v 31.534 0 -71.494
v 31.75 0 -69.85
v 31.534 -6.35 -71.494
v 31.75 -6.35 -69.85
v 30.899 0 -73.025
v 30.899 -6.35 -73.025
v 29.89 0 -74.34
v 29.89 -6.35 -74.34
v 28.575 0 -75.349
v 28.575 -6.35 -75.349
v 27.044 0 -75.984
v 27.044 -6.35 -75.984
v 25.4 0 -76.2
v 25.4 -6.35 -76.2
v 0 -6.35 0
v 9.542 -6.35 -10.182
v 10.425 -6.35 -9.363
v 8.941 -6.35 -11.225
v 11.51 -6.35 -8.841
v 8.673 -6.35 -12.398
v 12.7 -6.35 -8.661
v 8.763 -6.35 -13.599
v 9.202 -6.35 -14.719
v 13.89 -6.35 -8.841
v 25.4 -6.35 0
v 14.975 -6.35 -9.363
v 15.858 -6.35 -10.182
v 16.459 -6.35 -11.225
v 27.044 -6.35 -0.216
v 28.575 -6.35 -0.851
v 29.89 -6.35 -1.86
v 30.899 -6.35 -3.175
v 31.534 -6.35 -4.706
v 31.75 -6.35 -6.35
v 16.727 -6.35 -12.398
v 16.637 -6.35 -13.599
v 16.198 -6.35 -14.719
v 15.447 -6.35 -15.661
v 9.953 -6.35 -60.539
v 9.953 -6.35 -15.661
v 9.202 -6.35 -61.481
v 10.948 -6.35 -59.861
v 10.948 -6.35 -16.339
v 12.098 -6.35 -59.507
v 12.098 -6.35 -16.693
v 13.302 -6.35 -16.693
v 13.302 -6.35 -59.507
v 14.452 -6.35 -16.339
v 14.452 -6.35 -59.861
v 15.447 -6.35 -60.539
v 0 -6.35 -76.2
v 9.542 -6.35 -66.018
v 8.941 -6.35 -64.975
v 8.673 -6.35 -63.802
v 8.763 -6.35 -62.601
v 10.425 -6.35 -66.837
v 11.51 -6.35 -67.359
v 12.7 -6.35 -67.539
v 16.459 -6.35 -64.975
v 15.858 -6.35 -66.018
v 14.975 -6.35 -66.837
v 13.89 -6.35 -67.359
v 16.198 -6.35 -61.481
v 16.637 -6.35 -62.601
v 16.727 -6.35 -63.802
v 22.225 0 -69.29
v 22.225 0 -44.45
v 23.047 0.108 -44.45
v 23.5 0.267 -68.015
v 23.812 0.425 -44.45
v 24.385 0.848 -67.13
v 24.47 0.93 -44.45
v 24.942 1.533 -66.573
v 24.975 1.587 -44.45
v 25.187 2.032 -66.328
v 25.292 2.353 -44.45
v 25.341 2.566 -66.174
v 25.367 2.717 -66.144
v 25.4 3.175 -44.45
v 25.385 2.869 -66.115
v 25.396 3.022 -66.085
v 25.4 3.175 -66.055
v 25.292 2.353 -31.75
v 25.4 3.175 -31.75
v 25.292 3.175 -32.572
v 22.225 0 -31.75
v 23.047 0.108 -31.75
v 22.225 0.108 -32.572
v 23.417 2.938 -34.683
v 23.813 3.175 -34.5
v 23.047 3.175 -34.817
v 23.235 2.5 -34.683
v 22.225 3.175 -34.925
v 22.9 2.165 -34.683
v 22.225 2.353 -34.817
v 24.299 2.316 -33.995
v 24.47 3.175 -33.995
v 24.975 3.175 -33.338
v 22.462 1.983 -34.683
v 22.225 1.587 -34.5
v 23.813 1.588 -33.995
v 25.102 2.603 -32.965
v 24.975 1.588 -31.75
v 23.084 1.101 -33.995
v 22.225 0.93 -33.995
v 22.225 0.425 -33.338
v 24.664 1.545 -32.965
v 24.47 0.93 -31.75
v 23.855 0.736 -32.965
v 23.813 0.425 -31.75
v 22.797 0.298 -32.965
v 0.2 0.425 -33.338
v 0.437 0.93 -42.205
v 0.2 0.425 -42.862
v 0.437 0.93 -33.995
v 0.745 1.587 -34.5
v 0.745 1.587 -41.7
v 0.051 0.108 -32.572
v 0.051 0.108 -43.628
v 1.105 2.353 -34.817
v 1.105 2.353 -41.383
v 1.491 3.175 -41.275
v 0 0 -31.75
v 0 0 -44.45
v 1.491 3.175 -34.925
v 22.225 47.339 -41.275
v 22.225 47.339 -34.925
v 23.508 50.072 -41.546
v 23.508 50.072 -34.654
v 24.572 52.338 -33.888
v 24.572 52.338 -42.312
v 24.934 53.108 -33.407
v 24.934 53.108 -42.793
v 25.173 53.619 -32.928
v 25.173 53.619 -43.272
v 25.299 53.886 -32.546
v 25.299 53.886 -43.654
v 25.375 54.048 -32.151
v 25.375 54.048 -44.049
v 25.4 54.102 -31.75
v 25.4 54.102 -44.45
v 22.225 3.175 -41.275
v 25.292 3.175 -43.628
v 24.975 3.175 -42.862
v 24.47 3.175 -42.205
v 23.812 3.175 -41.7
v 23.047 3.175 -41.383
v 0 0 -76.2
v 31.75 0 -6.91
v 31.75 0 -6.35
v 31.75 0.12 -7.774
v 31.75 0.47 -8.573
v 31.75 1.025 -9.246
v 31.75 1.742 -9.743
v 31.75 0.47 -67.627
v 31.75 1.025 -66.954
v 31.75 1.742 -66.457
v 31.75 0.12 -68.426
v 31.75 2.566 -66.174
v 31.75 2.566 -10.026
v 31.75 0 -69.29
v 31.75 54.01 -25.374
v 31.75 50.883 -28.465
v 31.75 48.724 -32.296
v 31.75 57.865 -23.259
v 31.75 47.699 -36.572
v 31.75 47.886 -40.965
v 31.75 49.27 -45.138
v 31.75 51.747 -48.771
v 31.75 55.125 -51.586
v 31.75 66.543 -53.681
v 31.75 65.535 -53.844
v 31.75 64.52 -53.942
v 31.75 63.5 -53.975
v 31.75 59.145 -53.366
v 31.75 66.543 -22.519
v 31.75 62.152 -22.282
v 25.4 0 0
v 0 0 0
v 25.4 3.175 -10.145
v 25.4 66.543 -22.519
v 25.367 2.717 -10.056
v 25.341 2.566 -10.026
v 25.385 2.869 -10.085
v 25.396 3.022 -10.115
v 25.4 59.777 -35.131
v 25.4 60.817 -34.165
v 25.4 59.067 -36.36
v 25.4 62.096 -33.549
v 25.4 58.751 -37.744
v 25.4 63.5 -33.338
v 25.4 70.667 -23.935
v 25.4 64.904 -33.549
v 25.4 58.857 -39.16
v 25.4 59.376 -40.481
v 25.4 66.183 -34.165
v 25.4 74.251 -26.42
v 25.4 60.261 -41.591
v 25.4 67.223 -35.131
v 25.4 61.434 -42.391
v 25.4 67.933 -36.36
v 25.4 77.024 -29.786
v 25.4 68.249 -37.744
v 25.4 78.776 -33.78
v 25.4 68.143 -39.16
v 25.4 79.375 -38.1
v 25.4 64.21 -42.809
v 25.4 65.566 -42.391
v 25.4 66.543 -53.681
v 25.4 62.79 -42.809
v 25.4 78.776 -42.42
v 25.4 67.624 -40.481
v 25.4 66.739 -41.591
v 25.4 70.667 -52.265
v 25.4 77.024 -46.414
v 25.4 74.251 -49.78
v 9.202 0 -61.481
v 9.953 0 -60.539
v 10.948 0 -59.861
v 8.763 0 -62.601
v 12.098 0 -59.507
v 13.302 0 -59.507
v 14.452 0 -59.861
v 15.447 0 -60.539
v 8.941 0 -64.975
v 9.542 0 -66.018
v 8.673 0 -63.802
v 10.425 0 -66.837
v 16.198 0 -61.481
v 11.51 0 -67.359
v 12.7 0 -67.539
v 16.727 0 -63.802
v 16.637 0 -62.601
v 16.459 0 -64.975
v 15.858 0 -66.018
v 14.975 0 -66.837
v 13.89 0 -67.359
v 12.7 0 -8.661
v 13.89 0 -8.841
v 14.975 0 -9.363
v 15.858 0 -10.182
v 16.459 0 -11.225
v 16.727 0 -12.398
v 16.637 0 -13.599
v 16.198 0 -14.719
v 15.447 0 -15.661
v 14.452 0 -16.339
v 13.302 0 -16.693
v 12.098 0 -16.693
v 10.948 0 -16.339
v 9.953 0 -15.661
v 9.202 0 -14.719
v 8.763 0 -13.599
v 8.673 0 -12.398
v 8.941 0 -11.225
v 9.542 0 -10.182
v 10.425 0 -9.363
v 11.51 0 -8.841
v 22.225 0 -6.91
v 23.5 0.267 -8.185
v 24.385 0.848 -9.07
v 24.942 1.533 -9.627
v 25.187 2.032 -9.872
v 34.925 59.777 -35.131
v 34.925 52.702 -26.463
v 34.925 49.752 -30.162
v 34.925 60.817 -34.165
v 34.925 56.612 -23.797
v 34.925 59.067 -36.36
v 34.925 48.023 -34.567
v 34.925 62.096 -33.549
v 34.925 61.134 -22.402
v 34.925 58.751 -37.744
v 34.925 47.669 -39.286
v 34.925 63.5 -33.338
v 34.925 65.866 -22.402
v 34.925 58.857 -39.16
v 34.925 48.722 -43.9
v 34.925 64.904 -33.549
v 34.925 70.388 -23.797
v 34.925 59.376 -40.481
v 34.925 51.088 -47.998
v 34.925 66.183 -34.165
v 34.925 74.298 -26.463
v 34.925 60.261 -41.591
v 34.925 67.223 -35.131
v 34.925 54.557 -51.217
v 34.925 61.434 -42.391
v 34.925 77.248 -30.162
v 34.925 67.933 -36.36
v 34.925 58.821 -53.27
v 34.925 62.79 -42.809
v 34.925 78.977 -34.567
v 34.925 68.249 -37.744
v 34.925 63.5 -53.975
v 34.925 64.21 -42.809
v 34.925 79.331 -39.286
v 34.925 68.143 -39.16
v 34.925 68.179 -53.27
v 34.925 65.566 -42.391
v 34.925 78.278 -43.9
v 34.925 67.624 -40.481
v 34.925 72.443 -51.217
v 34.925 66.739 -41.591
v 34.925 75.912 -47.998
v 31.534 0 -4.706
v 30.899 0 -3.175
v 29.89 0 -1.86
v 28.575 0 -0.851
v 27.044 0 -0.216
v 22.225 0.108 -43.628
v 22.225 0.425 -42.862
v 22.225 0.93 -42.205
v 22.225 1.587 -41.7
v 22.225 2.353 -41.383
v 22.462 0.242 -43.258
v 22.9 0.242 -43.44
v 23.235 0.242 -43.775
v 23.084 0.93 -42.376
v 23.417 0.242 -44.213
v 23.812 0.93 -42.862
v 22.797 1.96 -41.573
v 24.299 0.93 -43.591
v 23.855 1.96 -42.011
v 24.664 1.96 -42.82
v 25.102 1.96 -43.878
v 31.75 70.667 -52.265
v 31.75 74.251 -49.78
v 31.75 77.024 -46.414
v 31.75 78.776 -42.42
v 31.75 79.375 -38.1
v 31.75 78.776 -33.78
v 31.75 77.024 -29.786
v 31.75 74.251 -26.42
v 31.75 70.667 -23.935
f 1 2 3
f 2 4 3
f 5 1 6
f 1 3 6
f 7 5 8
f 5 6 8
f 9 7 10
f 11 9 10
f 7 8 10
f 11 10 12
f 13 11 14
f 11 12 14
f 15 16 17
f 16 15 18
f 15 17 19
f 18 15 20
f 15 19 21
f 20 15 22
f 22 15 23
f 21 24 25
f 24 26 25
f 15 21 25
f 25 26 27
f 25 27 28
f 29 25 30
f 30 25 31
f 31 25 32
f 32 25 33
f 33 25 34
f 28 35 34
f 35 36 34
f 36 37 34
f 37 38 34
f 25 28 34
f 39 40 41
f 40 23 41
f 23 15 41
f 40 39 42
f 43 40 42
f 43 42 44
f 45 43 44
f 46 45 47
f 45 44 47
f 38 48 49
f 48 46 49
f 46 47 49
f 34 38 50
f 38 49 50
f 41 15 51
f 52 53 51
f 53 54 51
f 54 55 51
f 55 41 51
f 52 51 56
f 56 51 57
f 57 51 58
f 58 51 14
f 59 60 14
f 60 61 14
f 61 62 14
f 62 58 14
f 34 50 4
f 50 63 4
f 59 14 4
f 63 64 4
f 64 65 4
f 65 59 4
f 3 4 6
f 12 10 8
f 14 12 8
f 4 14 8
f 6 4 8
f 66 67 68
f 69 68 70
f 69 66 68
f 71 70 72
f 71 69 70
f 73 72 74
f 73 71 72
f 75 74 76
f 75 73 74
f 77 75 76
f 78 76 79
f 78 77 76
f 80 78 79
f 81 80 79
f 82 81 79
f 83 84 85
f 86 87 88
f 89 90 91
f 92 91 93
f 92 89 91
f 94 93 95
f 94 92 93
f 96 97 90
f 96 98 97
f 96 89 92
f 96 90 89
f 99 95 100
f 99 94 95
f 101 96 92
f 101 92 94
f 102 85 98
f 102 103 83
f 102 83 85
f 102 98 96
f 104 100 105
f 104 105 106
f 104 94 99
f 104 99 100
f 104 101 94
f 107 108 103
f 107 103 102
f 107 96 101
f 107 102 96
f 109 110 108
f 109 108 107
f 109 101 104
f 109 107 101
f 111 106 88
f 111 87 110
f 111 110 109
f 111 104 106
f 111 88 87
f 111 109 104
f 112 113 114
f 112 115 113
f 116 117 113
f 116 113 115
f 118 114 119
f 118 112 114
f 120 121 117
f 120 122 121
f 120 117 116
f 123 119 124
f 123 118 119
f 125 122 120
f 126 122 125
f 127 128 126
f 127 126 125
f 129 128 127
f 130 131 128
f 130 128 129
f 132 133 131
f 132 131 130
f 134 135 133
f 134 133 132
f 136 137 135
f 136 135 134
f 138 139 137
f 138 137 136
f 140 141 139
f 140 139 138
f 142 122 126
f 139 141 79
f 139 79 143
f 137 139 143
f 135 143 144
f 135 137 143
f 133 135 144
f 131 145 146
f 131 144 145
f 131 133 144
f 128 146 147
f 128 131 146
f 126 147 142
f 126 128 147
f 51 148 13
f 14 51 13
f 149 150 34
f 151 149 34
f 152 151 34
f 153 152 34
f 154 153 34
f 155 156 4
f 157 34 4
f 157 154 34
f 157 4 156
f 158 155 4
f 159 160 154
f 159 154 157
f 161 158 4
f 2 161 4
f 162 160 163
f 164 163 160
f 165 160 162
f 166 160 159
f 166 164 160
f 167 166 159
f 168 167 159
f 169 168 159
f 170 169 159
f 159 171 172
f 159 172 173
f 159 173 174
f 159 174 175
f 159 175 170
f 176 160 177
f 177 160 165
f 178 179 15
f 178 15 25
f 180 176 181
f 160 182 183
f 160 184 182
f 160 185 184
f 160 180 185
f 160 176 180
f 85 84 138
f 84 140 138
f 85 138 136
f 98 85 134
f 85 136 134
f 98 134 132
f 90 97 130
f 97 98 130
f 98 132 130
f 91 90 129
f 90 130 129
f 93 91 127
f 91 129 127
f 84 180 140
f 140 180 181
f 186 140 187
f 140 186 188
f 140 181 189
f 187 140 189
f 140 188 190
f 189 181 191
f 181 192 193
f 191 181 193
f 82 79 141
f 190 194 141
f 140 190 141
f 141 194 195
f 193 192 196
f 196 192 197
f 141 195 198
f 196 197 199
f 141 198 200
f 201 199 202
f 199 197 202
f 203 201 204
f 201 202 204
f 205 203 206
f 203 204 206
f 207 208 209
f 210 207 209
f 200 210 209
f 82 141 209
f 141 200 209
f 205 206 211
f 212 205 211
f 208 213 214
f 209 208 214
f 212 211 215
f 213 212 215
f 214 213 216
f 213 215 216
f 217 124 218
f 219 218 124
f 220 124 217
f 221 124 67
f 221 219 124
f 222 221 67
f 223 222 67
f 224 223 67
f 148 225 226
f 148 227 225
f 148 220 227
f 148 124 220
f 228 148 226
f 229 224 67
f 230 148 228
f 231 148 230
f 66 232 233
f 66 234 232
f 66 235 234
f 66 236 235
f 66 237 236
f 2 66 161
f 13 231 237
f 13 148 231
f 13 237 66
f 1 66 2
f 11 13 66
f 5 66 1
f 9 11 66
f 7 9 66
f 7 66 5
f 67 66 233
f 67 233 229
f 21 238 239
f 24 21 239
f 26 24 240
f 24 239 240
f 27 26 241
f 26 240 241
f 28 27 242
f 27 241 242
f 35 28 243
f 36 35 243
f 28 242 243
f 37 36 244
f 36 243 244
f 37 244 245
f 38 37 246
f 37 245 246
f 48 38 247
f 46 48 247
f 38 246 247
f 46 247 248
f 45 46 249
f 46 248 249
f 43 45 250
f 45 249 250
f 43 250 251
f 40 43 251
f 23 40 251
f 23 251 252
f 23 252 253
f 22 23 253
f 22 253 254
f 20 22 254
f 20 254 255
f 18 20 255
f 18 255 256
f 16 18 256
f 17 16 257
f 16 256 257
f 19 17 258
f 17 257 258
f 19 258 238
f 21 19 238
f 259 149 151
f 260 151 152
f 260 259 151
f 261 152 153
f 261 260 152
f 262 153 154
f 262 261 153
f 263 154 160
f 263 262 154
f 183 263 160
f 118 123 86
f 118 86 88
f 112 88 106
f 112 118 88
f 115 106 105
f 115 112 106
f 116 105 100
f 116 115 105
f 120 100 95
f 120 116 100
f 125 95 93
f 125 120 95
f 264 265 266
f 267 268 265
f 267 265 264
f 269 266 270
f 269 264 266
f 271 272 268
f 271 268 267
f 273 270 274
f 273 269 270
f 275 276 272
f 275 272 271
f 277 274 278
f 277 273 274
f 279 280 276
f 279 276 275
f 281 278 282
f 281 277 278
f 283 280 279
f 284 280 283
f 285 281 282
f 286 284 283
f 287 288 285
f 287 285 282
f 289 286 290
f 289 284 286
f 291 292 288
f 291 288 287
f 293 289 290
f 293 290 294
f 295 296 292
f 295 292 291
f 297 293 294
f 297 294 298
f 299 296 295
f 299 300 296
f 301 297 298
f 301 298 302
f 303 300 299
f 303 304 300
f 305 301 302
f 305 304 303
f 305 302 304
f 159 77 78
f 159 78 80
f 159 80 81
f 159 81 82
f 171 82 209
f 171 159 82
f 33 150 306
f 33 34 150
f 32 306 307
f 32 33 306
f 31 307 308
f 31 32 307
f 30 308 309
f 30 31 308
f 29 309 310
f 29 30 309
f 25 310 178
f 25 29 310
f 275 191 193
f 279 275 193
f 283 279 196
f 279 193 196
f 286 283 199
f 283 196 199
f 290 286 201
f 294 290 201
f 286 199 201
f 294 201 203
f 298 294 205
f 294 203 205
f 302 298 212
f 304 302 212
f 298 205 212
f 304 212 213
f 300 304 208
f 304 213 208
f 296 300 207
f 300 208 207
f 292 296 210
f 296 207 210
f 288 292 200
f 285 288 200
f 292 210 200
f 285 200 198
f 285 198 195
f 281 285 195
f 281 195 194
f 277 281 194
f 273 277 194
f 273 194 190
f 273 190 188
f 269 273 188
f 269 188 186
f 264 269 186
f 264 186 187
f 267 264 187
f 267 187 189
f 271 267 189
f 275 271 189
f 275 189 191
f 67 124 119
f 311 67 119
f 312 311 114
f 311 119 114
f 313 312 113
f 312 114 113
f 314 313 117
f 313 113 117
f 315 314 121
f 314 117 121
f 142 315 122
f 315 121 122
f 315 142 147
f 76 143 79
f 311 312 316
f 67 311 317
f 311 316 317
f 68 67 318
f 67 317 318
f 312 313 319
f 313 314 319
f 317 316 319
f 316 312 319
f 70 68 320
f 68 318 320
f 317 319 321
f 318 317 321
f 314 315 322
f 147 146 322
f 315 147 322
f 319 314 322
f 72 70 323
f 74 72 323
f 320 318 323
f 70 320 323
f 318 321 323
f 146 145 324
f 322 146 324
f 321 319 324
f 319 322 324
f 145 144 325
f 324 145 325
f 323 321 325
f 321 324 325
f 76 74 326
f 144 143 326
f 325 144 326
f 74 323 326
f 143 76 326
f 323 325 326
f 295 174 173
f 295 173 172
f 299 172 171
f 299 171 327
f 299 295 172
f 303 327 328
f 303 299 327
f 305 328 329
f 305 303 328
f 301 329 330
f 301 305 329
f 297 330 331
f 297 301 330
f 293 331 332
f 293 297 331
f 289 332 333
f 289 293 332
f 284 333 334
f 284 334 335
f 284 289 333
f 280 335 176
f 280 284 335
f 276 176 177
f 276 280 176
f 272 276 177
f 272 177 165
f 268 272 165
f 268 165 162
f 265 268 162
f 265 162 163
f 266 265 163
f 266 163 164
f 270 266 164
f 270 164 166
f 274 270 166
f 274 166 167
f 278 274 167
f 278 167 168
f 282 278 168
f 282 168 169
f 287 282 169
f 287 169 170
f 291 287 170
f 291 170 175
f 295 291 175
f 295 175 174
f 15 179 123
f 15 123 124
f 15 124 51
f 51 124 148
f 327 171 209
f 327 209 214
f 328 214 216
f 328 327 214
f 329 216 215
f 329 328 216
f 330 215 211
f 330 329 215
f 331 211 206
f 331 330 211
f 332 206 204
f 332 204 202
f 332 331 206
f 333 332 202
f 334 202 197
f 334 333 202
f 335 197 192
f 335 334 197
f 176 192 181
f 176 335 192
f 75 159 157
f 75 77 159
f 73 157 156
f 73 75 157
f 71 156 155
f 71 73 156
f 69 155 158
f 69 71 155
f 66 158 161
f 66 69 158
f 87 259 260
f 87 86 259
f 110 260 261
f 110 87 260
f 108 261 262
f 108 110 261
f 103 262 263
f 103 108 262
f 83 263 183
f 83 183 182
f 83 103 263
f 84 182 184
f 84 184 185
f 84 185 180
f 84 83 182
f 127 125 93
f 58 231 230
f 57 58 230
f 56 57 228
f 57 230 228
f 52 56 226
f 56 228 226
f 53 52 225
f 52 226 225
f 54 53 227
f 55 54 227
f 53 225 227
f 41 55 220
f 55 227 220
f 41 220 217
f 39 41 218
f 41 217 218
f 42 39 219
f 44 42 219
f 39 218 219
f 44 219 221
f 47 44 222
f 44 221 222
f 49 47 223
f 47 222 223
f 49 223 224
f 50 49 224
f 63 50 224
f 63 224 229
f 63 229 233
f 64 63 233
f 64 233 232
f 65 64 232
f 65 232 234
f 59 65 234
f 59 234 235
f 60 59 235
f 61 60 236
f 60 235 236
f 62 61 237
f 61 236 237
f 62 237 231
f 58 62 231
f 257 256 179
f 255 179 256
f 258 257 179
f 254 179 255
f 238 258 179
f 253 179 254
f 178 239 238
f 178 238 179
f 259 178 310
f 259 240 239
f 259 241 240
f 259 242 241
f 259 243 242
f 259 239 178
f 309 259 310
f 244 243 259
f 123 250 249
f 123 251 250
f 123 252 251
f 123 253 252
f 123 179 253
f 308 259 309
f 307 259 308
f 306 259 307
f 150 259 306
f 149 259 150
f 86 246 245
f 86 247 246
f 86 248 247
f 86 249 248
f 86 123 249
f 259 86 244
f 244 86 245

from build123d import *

# Parameters (mm, degrees)
SKETCH2_W       = 31.75
SKETCH2_H       = 76.2
SKETCH2_R       = 4.0386
EXTRUDE1_DEPTH  = 6.35
EXTRUDE2_DEPTH  = 6.35
EXTRUDE3_START  = 3.175
SKETCH4_R       = 15.875
EXTRUDE3_DEPTH  = 3.175
RIB1_REACH      = 117.441
SKETCH6_WALLS_W = 6.35
SKETCH6_WALLS_H = 292.649439439
SKETCH7_R       = 4.7625
EXTRUDE4_DEPTH  = 107.729125594
FILLET1_R       = 3.175
FILLET2_R       = 6.35


with BuildPart() as part:
    # Sketch2 → Extrude1 (new body)
    with BuildSketch(Plane(origin=(0, 0, 0), x_dir=(1, 0, 0), z_dir=(0, 1, 0))):
        with Locations((15.875, 38.1)):
            Rectangle(SKETCH2_W, SKETCH2_H)
        with Locations(Location((12.7, 12.7, 0), (0, 0, 270))):
            Circle(SKETCH2_R, mode=Mode.SUBTRACT)
        with Locations(Location((12.7, 63.5, 0), (0, 0, 90))):
            Circle(SKETCH2_R, mode=Mode.SUBTRACT)
    extrude(amount=-EXTRUDE1_DEPTH)

    # Sketch3 → Extrude2 (add)
    with BuildSketch(Plane(origin=(31.75, 0, 0), x_dir=(0, 0, -1), z_dir=(1, 0, 0))):
        with BuildLine():
            Line((9.525, 0), (66.675, 0))
            Line((66.675, 0), (53.680706216, 66.542567797))
            ThreePointArc((53.680706216, 66.542567797), (38.1, 79.375), (22.519293784, 66.542567797))
            Line((22.519293784, 66.542567797), (9.525, 0))
        make_face()
    extrude(amount=-EXTRUDE2_DEPTH)

    # Sketch4 → Extrude3 (add)
    with BuildSketch(Plane(origin=(31.75, 0, 0), x_dir=(0, 0, -1), z_dir=(1, 0, 0)).offset(EXTRUDE3_START)):
        with Locations((38.1, 63.5)):
            Circle(SKETCH4_R)
    extrude(amount=-EXTRUDE3_DEPTH)

    # Sketch6 walls → Rib1 (add, up to next)
    with BuildSketch(Plane(origin=(0, 0, 0), x_dir=(0, 0, 1), z_dir=(-0.9052035812190267, 0.42497820714508305, 0)), mode=Mode.PRIVATE) as rib1_sk1:
        with Locations((-38.1, 29.883885307)):
            Rectangle(SKETCH6_WALLS_W, SKETCH6_WALLS_H)
    rib1_tool1 = extrude(rib1_sk1.sketch, amount=-RIB1_REACH, mode=Mode.PRIVATE) - part.part
    add(rib1_tool1.solids().sort_by_distance((12.7, 27.051, -38.1))[0])

    # Sketch7 → Extrude4 (cut, through all)
    with BuildSketch(Plane(origin=(25.4, 0, -9.525), x_dir=(0, 0, 1), z_dir=(-1, 0, 0))):
        with Locations((-28.575, 63.5)):
            Circle(SKETCH7_R)
    extrude(amount=-EXTRUDE4_DEPTH, mode=Mode.SUBTRACT)

    # Fillet1
    fillet1_edges = [part.edges().sort_by_distance(p)[0] for p in [
        (28.575, 0, -66.675),
        (28.575, 0, -9.525),
        (25.4, 0, -22.225),
        (25.4, 27.051, -34.925),
        (12.7, 0, -34.925),
        (25.4, 27.051, -41.275),
        (12.7, 0, -41.275),
        (25.4, 0, -53.975),
    ]]
    fillet(fillet1_edges, radius=FILLET1_R)

    # Fillet2
    fillet2_edges = [part.edges().sort_by_distance(p)[0] for p in [
        (31.75, -3.175, -76.2),
        (31.75, -3.175, 0),
    ]]
    fillet(fillet2_edges, radius=FILLET2_R)


solid = part.part
